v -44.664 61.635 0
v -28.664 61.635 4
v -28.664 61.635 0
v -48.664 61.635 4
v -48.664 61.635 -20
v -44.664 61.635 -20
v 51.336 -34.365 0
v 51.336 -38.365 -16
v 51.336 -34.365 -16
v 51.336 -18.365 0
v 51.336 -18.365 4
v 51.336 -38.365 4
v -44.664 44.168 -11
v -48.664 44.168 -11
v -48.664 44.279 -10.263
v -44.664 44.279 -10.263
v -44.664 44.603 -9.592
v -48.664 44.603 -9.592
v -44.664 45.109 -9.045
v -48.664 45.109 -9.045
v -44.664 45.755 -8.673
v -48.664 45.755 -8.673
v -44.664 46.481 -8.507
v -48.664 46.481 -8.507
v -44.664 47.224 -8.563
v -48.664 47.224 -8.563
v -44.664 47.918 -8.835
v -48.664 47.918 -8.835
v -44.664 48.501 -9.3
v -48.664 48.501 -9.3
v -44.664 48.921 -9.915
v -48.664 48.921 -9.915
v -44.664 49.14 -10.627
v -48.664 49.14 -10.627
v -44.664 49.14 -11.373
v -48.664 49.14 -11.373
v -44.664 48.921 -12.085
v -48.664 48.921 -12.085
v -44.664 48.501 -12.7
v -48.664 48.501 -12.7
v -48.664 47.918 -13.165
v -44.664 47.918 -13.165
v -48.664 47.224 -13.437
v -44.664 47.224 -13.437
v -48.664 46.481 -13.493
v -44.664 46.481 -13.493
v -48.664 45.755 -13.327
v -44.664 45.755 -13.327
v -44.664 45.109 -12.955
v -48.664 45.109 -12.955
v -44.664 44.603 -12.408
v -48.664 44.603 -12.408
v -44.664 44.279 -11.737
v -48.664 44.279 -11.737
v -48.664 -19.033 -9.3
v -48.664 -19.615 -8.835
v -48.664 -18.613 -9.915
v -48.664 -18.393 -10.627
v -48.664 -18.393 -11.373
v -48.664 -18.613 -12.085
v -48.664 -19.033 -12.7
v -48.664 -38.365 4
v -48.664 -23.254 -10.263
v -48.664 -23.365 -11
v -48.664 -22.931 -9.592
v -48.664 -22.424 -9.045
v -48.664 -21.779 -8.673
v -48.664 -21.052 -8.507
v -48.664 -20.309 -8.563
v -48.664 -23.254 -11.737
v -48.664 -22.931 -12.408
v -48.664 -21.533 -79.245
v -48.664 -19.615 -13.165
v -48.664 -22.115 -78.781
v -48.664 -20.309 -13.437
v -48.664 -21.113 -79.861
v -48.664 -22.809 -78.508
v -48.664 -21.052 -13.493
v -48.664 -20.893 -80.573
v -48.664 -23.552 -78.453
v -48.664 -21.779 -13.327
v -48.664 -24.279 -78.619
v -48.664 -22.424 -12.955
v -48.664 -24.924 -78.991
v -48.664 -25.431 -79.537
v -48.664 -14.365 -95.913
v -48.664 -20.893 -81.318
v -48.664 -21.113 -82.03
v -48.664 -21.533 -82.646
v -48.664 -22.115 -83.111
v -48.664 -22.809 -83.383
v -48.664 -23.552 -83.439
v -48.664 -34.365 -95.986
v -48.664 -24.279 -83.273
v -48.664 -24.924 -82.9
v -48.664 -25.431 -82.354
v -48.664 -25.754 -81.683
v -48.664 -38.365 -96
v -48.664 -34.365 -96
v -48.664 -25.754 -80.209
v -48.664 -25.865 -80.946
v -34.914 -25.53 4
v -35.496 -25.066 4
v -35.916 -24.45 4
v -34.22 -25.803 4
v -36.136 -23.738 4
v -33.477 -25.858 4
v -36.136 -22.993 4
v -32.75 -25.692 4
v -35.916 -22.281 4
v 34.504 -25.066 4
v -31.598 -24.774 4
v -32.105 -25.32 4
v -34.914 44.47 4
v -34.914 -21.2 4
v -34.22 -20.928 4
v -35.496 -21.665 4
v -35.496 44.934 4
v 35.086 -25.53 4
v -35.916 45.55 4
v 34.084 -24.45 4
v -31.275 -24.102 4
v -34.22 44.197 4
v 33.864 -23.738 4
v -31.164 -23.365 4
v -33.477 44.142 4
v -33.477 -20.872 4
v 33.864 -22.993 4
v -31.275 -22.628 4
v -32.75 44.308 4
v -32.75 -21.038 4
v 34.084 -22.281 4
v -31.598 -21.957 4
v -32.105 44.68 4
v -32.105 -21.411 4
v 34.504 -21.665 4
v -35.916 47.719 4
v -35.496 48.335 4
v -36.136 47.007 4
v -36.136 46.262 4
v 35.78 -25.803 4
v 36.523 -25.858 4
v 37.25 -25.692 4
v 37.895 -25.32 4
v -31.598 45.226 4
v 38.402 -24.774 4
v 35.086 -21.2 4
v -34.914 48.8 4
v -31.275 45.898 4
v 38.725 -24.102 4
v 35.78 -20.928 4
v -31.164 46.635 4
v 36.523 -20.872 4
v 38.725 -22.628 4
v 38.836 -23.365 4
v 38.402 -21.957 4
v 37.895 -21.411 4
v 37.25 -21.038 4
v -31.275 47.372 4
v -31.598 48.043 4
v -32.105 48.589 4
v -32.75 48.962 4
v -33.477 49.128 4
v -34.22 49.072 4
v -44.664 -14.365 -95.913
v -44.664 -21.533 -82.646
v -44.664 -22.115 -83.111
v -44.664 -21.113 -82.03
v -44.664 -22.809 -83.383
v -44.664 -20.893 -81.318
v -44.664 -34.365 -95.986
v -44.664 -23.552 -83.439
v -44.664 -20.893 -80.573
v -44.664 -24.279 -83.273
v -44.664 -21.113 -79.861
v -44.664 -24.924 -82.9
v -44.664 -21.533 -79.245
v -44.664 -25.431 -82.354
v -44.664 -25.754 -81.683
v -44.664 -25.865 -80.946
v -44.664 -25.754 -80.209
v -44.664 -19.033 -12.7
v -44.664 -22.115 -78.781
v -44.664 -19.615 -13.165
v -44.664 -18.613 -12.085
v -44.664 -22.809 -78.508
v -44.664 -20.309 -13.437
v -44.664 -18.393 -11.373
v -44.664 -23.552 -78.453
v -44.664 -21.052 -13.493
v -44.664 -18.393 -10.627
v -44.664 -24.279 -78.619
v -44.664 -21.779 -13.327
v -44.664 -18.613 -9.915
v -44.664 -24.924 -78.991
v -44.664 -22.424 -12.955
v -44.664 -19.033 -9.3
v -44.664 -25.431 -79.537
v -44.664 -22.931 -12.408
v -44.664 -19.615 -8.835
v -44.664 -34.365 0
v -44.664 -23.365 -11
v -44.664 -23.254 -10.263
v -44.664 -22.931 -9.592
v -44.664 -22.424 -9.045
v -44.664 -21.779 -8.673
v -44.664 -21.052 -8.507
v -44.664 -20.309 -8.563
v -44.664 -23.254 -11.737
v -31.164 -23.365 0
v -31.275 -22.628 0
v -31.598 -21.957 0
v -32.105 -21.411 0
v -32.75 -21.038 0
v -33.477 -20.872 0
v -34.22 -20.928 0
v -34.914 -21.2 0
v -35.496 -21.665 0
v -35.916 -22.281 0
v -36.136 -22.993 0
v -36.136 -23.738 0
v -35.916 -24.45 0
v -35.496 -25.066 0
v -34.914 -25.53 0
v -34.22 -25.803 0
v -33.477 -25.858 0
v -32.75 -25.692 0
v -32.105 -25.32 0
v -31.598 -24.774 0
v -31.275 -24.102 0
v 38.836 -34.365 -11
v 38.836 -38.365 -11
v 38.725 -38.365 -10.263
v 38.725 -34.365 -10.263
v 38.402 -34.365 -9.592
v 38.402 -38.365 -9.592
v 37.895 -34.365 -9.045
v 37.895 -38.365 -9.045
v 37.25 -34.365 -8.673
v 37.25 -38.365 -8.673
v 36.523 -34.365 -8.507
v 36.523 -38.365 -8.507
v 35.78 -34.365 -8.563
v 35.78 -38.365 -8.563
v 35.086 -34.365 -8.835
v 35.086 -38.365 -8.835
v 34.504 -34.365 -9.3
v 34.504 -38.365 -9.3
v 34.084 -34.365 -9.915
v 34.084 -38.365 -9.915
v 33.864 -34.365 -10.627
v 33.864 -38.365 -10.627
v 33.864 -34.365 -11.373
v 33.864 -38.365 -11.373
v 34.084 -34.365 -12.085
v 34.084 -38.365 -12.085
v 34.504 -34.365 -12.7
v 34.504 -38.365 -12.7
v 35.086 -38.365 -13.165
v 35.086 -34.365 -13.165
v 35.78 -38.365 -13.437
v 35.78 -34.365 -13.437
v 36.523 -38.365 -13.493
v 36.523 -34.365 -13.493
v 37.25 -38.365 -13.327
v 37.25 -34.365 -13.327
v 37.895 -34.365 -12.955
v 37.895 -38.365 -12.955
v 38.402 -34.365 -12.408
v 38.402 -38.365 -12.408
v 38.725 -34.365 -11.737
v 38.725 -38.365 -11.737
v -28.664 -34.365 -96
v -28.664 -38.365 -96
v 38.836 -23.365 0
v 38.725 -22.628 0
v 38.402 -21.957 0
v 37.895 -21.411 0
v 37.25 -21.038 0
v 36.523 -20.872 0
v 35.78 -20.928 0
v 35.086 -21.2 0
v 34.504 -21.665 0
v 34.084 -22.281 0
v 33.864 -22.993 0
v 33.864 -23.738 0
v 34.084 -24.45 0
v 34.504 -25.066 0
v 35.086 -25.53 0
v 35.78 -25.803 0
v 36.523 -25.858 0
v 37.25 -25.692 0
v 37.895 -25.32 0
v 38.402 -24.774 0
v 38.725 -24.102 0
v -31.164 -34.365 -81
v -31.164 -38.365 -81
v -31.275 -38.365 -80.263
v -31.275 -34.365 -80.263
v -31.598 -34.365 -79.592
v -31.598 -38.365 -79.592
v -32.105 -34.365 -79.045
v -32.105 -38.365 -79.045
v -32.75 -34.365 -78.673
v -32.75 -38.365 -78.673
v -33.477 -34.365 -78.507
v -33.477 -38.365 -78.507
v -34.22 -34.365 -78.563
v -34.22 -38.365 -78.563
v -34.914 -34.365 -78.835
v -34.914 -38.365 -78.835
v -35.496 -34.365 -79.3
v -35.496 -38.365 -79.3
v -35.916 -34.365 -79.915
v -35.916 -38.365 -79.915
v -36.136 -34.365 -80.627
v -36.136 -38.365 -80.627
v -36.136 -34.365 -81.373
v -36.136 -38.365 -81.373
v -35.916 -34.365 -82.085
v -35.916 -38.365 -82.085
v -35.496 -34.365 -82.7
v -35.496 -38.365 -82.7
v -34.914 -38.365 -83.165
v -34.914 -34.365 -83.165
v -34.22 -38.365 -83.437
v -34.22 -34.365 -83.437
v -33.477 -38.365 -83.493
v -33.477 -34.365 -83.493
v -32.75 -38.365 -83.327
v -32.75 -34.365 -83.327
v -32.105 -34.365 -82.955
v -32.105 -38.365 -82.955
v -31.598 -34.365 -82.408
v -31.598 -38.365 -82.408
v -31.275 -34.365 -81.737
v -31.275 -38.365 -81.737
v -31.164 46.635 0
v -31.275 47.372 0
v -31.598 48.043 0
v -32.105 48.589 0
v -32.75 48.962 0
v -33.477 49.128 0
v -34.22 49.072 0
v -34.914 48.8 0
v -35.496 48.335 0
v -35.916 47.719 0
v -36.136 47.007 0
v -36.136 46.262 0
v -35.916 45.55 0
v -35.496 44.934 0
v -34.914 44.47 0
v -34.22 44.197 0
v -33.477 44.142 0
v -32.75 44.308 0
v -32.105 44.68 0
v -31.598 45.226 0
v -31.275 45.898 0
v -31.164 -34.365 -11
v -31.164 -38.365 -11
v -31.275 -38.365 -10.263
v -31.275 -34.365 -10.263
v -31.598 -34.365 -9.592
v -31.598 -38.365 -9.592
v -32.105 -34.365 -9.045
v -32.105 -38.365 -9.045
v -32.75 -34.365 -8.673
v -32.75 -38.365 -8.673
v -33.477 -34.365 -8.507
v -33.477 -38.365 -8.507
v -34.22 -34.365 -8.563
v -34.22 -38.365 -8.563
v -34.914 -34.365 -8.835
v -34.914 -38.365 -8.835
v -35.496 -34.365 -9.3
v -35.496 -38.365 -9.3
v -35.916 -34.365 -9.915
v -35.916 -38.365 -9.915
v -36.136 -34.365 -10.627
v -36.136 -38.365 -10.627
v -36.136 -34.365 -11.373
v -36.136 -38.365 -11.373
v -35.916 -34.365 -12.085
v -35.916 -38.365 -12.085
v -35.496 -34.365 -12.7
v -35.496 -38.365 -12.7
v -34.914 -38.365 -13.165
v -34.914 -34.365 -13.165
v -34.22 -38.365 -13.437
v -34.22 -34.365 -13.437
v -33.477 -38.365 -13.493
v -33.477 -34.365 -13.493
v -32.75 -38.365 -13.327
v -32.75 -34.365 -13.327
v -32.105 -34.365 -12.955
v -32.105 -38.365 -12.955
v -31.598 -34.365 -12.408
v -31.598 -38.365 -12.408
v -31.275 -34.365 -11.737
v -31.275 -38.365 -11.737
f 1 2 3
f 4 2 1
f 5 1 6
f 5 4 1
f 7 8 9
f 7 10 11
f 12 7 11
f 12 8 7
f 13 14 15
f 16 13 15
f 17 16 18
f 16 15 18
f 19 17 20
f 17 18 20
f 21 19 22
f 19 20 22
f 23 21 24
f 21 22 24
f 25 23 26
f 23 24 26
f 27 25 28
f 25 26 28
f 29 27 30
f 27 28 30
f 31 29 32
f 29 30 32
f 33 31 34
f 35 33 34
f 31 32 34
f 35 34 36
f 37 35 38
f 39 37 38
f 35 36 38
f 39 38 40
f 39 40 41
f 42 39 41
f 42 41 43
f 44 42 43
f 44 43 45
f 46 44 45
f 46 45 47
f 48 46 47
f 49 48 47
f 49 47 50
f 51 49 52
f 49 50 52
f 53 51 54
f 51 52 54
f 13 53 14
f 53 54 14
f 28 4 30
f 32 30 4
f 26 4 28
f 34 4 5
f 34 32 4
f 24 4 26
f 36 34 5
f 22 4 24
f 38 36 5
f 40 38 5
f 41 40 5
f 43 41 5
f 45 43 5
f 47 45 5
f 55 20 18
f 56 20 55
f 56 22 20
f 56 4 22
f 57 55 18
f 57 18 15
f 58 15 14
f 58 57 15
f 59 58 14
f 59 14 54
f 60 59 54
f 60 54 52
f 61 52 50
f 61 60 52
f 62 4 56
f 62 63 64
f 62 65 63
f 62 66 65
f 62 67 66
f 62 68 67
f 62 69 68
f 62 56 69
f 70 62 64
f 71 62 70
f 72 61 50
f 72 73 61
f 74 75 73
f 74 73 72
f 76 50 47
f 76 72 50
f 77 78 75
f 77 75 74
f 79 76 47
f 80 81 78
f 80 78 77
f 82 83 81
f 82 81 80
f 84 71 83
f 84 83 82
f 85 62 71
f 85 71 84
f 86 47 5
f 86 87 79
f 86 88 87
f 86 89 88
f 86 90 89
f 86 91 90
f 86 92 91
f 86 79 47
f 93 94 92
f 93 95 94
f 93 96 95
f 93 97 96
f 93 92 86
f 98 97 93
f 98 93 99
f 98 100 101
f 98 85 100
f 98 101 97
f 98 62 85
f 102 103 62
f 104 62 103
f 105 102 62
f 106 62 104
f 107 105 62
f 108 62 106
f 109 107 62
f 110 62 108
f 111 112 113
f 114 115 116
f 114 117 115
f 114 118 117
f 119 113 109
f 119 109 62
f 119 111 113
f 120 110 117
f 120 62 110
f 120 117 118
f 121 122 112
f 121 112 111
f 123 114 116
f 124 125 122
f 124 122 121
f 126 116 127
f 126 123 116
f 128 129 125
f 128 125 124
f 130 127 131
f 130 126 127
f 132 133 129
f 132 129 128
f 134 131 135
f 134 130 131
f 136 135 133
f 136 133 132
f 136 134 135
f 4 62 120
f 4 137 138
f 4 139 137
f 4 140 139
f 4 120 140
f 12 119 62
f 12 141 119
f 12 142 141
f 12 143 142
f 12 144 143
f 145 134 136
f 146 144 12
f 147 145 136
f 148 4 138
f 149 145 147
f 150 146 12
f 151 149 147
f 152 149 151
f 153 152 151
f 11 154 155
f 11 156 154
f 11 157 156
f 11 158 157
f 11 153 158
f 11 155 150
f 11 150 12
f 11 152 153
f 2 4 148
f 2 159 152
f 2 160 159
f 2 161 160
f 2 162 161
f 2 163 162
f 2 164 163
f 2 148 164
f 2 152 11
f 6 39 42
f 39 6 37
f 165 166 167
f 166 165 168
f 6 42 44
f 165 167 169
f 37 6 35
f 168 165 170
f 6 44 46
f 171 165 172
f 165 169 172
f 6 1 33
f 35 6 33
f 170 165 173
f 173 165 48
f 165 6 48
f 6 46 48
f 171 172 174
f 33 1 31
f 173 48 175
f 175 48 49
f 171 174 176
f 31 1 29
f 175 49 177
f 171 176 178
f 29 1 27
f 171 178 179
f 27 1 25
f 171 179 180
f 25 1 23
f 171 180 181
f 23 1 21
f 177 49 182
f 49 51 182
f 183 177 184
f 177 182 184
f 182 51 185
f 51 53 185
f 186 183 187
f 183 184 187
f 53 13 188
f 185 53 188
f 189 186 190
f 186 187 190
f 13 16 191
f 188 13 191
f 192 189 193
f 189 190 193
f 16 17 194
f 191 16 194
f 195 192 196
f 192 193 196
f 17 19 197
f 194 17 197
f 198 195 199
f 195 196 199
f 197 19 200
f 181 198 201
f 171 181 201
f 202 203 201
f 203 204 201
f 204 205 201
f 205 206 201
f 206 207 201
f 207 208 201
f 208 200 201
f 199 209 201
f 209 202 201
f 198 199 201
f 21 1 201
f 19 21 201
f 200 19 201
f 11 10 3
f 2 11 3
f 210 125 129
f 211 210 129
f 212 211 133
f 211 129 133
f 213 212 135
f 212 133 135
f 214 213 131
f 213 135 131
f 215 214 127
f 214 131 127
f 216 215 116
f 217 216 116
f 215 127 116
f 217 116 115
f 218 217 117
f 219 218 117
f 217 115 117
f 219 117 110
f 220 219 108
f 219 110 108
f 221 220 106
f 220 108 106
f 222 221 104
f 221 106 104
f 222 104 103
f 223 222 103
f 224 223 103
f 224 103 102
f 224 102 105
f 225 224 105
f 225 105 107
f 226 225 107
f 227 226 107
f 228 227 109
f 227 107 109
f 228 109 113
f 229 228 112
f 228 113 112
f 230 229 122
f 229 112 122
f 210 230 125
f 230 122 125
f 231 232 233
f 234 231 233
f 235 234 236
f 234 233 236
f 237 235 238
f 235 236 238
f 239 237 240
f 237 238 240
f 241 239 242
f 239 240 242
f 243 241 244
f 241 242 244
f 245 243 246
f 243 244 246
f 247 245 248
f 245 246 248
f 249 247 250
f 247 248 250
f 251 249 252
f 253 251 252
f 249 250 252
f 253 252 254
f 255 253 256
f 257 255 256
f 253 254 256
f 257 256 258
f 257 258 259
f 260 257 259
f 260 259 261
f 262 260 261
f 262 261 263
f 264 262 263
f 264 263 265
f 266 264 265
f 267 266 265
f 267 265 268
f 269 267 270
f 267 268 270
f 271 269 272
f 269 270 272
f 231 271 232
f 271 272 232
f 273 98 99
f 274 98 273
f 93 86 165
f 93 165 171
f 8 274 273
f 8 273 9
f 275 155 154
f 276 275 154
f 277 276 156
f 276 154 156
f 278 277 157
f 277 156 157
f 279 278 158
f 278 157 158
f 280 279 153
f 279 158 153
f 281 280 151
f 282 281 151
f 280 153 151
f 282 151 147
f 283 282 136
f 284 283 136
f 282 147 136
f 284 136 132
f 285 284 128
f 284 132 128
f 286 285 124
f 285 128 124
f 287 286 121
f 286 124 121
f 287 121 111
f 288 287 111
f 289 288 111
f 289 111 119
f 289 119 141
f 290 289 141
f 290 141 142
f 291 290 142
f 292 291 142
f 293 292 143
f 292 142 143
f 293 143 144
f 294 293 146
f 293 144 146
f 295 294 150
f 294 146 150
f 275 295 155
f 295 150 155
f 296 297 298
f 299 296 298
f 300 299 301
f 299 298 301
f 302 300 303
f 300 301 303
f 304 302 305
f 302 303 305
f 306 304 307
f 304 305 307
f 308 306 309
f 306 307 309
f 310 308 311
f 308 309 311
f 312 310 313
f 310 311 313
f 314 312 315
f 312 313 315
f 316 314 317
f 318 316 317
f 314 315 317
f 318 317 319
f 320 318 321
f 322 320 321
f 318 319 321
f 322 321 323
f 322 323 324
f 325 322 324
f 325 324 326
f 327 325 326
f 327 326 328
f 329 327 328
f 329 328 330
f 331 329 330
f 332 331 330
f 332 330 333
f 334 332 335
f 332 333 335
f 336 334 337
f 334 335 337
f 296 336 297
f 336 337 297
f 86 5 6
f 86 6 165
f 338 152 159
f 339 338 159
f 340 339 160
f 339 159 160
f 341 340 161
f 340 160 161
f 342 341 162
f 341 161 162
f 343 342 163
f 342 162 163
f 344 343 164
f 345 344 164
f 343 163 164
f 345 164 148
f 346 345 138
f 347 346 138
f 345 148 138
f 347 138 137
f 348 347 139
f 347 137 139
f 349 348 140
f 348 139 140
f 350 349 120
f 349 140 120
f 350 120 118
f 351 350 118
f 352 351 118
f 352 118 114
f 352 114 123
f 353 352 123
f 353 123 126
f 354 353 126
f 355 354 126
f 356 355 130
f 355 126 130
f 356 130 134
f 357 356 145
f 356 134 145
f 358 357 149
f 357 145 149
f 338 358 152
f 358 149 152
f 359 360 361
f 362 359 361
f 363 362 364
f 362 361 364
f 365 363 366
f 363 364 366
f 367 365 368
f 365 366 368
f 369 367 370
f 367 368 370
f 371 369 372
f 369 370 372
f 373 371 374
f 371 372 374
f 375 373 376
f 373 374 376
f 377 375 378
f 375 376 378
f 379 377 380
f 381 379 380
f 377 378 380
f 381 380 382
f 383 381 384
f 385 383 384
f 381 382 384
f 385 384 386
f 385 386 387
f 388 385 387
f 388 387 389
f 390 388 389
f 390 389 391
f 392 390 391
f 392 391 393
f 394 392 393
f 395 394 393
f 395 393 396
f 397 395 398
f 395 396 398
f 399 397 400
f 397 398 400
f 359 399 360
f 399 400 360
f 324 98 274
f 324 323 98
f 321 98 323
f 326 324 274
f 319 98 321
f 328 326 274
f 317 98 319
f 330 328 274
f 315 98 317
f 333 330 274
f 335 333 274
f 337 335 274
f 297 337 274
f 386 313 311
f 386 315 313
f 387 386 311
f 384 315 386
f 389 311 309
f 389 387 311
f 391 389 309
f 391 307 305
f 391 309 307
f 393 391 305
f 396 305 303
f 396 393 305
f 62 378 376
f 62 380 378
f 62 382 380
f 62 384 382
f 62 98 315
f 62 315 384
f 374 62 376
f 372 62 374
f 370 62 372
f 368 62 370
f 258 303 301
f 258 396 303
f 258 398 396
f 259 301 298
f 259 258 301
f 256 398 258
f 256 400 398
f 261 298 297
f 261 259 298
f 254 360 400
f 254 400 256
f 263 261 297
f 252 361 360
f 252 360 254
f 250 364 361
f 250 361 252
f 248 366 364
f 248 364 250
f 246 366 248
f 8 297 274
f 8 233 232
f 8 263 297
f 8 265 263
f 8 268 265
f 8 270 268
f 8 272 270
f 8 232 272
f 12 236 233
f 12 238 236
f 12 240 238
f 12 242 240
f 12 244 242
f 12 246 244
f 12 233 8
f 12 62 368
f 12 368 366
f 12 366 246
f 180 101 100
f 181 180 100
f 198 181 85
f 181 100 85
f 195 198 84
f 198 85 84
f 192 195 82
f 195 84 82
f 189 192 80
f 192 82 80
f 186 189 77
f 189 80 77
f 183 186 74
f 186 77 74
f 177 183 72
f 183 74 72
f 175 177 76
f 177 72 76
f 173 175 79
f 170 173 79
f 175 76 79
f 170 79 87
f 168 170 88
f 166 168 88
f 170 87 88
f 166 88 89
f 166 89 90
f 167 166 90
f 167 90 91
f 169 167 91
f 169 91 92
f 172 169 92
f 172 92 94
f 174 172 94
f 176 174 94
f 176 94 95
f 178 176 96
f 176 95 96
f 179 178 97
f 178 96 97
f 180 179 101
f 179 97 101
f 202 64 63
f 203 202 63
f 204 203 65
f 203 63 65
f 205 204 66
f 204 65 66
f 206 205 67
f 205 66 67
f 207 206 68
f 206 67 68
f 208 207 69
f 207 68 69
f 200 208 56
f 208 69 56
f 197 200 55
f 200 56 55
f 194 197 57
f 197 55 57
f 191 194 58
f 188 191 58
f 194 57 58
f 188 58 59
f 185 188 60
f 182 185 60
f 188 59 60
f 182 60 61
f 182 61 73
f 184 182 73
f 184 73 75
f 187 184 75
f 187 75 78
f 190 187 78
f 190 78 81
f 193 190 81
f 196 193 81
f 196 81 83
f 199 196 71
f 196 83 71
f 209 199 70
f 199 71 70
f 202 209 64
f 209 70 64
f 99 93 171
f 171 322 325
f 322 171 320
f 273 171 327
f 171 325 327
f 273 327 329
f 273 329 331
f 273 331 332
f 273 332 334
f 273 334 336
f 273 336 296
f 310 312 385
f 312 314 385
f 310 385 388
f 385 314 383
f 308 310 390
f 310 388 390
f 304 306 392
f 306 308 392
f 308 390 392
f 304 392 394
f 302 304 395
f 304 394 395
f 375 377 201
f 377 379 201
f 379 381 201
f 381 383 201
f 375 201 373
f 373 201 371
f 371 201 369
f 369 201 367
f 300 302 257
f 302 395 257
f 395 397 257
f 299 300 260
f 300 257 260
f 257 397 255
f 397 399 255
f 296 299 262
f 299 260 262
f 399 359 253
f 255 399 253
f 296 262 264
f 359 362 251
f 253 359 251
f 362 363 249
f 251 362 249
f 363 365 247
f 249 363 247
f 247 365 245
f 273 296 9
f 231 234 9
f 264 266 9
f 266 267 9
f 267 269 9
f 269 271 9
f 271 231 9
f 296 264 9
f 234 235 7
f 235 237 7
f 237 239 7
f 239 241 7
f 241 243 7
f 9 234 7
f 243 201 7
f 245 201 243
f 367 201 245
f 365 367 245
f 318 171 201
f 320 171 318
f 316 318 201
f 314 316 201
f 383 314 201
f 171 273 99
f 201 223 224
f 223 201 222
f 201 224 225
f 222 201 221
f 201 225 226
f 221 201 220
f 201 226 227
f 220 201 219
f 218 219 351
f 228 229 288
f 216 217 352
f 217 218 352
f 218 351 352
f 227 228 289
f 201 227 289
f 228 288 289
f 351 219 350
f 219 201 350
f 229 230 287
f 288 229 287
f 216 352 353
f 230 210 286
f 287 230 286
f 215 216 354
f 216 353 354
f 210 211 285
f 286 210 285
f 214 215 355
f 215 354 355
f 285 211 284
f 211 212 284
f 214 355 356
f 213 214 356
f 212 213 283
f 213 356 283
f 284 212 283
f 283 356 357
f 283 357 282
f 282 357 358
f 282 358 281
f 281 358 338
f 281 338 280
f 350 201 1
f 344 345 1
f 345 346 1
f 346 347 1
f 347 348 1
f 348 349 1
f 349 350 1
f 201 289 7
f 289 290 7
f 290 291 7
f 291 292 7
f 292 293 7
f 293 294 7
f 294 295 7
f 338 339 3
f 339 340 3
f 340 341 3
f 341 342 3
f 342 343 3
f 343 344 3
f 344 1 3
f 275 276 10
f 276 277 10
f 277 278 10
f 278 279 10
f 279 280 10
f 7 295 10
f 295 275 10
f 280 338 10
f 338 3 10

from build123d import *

# Parameters (mm, degrees)
F1_DEPTH  = 4
F4_DEPTH  = 4
F9_DEPTH  = 4
F10_R     = 2
F11_DEPTH = 4
F12_R     = 2.5
F13_DEPTH = 4
F14_R     = 2.5
F15_DEPTH = 4
F16_R     = 2.5
F17_DEPTH = 4


with BuildPart() as f1:
    # F0 (on Top) → F1 (new body)
    with BuildSketch(Plane.XY):
        Polygon((-28.663731938, 61.6347389425), (-48.663731938, 61.6347389425), (-48.663731938, -38.3652610575), (51.336268062, -38.3652610575), (51.336268062, -18.3652610575), align=None)
    extrude(amount=F1_DEPTH)



with BuildPart() as f4:
    # F3 (on offset) → F4 (new body)
    with BuildSketch(Plane(origin=(-48.663731938, 0, 0), x_dir=(0, -1, 0), z_dir=(-1, 0, 0))):
        Polygon((38.3652610575, 0), (-61.6347389425, 0), (-61.6347389425, -20), (14.3654177458, -95.9132762154), (38.3652610575, -96), align=None)
    extrude(amount=-F4_DEPTH)


with BuildPart() as f1_1:
    add(f1.part)

    add(f4.part)  # F9 merges F4
    # F8 (on offset) → F9 (join)
    with BuildSketch(Plane.XZ.offset(38.3652610575)):
        Polygon((51.336268062, -16), (51.336268062, 4), (-48.663731938, 4), (-48.663731938, -96), (-28.663731938, -96), align=None)
    extrude(amount=-F9_DEPTH)

    # F10 (on face) → F11 (cut)
    with BuildSketch(Plane.XZ.offset(38.3652610575)):
        with Locations((36.336268062, -11)):
            Circle(F10_R)
        with Locations((-33.663731938, -11)):
            Circle(F10_R)
        with Locations((-33.663731938, -81)):
            Circle(F10_R)
    extrude(amount=-F11_DEPTH, mode=Mode.SUBTRACT)

    # F12 (on face) → F13 (cut)
    with BuildSketch(Plane.XZ.offset(38.3652610575)):
        with Locations((36.336268062, -11)):
            Circle(F12_R)
        with Locations((-33.663731938, -11)):
            Circle(F12_R)
        with Locations((-33.663731938, -81)):
            Circle(F12_R)
    extrude(amount=-F13_DEPTH, mode=Mode.SUBTRACT)

    # F14 (on face) → F15 (cut)
    with BuildSketch(Plane(origin=(-48.663731938, 0, 0), x_dir=(0, -1, 0), z_dir=(-1, 0, 0))):
        with Locations((-46.6681093954, -11)):
            Circle(F14_R)
        with Locations((20.8652610575, -11)):
            Circle(F14_R)
        with Locations((23.3652610575, -80.9456993499)):
            Circle(F14_R)
    extrude(amount=-F15_DEPTH, mode=Mode.SUBTRACT)

    # F16 (on face) → F17 (cut)
    with BuildSketch(Plane.XY.offset(4)):
        with Locations((-33.663731938, 46.6347389425)):
            Circle(F16_R)
        with Locations((-33.663731938, -23.3652610575)):
            Circle(F16_R)
        with Locations((36.336268062, -23.3652610575)):
            Circle(F16_R)
    extrude(amount=-F17_DEPTH, mode=Mode.SUBTRACT)


solid = f1_1.part
